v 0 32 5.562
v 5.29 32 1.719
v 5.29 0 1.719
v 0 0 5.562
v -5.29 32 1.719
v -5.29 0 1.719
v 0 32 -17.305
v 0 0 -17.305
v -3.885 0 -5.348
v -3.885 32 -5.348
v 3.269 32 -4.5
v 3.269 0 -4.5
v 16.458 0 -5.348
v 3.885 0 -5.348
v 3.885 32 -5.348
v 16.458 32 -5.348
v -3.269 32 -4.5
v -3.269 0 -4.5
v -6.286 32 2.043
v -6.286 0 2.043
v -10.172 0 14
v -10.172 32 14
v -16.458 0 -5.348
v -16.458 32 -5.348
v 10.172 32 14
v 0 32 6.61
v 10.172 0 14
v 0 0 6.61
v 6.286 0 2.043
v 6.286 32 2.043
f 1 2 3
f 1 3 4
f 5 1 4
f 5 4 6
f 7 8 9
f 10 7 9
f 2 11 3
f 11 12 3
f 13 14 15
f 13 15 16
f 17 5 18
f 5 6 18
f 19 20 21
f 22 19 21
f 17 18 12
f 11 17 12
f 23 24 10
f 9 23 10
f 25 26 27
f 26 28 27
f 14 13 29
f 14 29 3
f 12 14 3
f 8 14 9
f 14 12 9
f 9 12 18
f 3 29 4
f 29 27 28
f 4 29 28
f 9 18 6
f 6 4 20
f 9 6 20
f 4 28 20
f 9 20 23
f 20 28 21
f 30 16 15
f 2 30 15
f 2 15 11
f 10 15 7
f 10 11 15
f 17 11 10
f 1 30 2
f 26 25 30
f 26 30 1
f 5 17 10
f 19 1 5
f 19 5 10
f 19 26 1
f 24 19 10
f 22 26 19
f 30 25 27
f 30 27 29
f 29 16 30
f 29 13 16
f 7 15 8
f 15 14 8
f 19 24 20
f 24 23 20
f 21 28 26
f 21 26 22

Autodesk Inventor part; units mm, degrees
ref_plane "YZ Plane" through (0, 0, 0) normal (1, 0, 0) x (0, 1, 0)
ref_plane "XZ Plane" through (0, 0, 0) normal (0, 1, 0) x (-1, 0, 0)
ref_plane "XY Plane" through (0, 0, 0) normal (0, 0, 1) x (1, 0, 0)
sketch "Sketch1" plane through (0, 0, 0) normal (0, 1, 0) x (-1, 0, 0)
  line L0 (0, 0) -> (0, 14)
  line L1 (10.1716, 14) -> (16.458, -5.3475)
  line L2 (16.458, -5.3475) -> (0, -17.305)
  line L3 (0, -17.305) -> (-16.458, -5.3475)
  line L4 (-16.458, -5.3475) -> (-10.1716, 14)
  line L5 (-10.1716, 14) -> (10.1716, 14)
  line L6 (0, -17.305) -> (10.1716, 14)
  line L7 (-10.1716, 14) -> (0, -17.305)
  line L8 (16.458, -5.3475) -> (-16.458, -5.3475)
  line L9 (-16.458, -5.3475) -> (10.1716, 14)
  line L10 (16.458, -5.3475) -> (-10.1716, 14)
  line L11 (0, 0) -> (0, -4.5)
  line L12 (-3.2694, -4.5) -> (-5.2901, 1.7188)
  line L13 (-5.2901, 1.7188) -> (0, 5.5623)
  line L14 (0, 5.5623) -> (5.2901, 1.7188)
  line L15 (5.2901, 1.7188) -> (3.2694, -4.5)
  line L16 (3.2694, -4.5) -> (-3.2694, -4.5)
  point P0 (-3.8852, -5.3475)
  point P1 (3.8852, -5.3475)
  point P2 (6.2864, 2.0426)
  point P3 (0, 6.6099)
  point P4 (-6.2864, 2.0426)
  dimension "d0" = 14
  dimension "d3" = 4.5
extrude "Extrusion2" add sketch "Sketch1" along normal blind 32 contours L10 L6 L8 L7 L9 | L9 L7 L10 | L9 L6 L10 | L7 L8 L9 | L10 L8 L6 | L8 L6 L7
properties part number "Star"
